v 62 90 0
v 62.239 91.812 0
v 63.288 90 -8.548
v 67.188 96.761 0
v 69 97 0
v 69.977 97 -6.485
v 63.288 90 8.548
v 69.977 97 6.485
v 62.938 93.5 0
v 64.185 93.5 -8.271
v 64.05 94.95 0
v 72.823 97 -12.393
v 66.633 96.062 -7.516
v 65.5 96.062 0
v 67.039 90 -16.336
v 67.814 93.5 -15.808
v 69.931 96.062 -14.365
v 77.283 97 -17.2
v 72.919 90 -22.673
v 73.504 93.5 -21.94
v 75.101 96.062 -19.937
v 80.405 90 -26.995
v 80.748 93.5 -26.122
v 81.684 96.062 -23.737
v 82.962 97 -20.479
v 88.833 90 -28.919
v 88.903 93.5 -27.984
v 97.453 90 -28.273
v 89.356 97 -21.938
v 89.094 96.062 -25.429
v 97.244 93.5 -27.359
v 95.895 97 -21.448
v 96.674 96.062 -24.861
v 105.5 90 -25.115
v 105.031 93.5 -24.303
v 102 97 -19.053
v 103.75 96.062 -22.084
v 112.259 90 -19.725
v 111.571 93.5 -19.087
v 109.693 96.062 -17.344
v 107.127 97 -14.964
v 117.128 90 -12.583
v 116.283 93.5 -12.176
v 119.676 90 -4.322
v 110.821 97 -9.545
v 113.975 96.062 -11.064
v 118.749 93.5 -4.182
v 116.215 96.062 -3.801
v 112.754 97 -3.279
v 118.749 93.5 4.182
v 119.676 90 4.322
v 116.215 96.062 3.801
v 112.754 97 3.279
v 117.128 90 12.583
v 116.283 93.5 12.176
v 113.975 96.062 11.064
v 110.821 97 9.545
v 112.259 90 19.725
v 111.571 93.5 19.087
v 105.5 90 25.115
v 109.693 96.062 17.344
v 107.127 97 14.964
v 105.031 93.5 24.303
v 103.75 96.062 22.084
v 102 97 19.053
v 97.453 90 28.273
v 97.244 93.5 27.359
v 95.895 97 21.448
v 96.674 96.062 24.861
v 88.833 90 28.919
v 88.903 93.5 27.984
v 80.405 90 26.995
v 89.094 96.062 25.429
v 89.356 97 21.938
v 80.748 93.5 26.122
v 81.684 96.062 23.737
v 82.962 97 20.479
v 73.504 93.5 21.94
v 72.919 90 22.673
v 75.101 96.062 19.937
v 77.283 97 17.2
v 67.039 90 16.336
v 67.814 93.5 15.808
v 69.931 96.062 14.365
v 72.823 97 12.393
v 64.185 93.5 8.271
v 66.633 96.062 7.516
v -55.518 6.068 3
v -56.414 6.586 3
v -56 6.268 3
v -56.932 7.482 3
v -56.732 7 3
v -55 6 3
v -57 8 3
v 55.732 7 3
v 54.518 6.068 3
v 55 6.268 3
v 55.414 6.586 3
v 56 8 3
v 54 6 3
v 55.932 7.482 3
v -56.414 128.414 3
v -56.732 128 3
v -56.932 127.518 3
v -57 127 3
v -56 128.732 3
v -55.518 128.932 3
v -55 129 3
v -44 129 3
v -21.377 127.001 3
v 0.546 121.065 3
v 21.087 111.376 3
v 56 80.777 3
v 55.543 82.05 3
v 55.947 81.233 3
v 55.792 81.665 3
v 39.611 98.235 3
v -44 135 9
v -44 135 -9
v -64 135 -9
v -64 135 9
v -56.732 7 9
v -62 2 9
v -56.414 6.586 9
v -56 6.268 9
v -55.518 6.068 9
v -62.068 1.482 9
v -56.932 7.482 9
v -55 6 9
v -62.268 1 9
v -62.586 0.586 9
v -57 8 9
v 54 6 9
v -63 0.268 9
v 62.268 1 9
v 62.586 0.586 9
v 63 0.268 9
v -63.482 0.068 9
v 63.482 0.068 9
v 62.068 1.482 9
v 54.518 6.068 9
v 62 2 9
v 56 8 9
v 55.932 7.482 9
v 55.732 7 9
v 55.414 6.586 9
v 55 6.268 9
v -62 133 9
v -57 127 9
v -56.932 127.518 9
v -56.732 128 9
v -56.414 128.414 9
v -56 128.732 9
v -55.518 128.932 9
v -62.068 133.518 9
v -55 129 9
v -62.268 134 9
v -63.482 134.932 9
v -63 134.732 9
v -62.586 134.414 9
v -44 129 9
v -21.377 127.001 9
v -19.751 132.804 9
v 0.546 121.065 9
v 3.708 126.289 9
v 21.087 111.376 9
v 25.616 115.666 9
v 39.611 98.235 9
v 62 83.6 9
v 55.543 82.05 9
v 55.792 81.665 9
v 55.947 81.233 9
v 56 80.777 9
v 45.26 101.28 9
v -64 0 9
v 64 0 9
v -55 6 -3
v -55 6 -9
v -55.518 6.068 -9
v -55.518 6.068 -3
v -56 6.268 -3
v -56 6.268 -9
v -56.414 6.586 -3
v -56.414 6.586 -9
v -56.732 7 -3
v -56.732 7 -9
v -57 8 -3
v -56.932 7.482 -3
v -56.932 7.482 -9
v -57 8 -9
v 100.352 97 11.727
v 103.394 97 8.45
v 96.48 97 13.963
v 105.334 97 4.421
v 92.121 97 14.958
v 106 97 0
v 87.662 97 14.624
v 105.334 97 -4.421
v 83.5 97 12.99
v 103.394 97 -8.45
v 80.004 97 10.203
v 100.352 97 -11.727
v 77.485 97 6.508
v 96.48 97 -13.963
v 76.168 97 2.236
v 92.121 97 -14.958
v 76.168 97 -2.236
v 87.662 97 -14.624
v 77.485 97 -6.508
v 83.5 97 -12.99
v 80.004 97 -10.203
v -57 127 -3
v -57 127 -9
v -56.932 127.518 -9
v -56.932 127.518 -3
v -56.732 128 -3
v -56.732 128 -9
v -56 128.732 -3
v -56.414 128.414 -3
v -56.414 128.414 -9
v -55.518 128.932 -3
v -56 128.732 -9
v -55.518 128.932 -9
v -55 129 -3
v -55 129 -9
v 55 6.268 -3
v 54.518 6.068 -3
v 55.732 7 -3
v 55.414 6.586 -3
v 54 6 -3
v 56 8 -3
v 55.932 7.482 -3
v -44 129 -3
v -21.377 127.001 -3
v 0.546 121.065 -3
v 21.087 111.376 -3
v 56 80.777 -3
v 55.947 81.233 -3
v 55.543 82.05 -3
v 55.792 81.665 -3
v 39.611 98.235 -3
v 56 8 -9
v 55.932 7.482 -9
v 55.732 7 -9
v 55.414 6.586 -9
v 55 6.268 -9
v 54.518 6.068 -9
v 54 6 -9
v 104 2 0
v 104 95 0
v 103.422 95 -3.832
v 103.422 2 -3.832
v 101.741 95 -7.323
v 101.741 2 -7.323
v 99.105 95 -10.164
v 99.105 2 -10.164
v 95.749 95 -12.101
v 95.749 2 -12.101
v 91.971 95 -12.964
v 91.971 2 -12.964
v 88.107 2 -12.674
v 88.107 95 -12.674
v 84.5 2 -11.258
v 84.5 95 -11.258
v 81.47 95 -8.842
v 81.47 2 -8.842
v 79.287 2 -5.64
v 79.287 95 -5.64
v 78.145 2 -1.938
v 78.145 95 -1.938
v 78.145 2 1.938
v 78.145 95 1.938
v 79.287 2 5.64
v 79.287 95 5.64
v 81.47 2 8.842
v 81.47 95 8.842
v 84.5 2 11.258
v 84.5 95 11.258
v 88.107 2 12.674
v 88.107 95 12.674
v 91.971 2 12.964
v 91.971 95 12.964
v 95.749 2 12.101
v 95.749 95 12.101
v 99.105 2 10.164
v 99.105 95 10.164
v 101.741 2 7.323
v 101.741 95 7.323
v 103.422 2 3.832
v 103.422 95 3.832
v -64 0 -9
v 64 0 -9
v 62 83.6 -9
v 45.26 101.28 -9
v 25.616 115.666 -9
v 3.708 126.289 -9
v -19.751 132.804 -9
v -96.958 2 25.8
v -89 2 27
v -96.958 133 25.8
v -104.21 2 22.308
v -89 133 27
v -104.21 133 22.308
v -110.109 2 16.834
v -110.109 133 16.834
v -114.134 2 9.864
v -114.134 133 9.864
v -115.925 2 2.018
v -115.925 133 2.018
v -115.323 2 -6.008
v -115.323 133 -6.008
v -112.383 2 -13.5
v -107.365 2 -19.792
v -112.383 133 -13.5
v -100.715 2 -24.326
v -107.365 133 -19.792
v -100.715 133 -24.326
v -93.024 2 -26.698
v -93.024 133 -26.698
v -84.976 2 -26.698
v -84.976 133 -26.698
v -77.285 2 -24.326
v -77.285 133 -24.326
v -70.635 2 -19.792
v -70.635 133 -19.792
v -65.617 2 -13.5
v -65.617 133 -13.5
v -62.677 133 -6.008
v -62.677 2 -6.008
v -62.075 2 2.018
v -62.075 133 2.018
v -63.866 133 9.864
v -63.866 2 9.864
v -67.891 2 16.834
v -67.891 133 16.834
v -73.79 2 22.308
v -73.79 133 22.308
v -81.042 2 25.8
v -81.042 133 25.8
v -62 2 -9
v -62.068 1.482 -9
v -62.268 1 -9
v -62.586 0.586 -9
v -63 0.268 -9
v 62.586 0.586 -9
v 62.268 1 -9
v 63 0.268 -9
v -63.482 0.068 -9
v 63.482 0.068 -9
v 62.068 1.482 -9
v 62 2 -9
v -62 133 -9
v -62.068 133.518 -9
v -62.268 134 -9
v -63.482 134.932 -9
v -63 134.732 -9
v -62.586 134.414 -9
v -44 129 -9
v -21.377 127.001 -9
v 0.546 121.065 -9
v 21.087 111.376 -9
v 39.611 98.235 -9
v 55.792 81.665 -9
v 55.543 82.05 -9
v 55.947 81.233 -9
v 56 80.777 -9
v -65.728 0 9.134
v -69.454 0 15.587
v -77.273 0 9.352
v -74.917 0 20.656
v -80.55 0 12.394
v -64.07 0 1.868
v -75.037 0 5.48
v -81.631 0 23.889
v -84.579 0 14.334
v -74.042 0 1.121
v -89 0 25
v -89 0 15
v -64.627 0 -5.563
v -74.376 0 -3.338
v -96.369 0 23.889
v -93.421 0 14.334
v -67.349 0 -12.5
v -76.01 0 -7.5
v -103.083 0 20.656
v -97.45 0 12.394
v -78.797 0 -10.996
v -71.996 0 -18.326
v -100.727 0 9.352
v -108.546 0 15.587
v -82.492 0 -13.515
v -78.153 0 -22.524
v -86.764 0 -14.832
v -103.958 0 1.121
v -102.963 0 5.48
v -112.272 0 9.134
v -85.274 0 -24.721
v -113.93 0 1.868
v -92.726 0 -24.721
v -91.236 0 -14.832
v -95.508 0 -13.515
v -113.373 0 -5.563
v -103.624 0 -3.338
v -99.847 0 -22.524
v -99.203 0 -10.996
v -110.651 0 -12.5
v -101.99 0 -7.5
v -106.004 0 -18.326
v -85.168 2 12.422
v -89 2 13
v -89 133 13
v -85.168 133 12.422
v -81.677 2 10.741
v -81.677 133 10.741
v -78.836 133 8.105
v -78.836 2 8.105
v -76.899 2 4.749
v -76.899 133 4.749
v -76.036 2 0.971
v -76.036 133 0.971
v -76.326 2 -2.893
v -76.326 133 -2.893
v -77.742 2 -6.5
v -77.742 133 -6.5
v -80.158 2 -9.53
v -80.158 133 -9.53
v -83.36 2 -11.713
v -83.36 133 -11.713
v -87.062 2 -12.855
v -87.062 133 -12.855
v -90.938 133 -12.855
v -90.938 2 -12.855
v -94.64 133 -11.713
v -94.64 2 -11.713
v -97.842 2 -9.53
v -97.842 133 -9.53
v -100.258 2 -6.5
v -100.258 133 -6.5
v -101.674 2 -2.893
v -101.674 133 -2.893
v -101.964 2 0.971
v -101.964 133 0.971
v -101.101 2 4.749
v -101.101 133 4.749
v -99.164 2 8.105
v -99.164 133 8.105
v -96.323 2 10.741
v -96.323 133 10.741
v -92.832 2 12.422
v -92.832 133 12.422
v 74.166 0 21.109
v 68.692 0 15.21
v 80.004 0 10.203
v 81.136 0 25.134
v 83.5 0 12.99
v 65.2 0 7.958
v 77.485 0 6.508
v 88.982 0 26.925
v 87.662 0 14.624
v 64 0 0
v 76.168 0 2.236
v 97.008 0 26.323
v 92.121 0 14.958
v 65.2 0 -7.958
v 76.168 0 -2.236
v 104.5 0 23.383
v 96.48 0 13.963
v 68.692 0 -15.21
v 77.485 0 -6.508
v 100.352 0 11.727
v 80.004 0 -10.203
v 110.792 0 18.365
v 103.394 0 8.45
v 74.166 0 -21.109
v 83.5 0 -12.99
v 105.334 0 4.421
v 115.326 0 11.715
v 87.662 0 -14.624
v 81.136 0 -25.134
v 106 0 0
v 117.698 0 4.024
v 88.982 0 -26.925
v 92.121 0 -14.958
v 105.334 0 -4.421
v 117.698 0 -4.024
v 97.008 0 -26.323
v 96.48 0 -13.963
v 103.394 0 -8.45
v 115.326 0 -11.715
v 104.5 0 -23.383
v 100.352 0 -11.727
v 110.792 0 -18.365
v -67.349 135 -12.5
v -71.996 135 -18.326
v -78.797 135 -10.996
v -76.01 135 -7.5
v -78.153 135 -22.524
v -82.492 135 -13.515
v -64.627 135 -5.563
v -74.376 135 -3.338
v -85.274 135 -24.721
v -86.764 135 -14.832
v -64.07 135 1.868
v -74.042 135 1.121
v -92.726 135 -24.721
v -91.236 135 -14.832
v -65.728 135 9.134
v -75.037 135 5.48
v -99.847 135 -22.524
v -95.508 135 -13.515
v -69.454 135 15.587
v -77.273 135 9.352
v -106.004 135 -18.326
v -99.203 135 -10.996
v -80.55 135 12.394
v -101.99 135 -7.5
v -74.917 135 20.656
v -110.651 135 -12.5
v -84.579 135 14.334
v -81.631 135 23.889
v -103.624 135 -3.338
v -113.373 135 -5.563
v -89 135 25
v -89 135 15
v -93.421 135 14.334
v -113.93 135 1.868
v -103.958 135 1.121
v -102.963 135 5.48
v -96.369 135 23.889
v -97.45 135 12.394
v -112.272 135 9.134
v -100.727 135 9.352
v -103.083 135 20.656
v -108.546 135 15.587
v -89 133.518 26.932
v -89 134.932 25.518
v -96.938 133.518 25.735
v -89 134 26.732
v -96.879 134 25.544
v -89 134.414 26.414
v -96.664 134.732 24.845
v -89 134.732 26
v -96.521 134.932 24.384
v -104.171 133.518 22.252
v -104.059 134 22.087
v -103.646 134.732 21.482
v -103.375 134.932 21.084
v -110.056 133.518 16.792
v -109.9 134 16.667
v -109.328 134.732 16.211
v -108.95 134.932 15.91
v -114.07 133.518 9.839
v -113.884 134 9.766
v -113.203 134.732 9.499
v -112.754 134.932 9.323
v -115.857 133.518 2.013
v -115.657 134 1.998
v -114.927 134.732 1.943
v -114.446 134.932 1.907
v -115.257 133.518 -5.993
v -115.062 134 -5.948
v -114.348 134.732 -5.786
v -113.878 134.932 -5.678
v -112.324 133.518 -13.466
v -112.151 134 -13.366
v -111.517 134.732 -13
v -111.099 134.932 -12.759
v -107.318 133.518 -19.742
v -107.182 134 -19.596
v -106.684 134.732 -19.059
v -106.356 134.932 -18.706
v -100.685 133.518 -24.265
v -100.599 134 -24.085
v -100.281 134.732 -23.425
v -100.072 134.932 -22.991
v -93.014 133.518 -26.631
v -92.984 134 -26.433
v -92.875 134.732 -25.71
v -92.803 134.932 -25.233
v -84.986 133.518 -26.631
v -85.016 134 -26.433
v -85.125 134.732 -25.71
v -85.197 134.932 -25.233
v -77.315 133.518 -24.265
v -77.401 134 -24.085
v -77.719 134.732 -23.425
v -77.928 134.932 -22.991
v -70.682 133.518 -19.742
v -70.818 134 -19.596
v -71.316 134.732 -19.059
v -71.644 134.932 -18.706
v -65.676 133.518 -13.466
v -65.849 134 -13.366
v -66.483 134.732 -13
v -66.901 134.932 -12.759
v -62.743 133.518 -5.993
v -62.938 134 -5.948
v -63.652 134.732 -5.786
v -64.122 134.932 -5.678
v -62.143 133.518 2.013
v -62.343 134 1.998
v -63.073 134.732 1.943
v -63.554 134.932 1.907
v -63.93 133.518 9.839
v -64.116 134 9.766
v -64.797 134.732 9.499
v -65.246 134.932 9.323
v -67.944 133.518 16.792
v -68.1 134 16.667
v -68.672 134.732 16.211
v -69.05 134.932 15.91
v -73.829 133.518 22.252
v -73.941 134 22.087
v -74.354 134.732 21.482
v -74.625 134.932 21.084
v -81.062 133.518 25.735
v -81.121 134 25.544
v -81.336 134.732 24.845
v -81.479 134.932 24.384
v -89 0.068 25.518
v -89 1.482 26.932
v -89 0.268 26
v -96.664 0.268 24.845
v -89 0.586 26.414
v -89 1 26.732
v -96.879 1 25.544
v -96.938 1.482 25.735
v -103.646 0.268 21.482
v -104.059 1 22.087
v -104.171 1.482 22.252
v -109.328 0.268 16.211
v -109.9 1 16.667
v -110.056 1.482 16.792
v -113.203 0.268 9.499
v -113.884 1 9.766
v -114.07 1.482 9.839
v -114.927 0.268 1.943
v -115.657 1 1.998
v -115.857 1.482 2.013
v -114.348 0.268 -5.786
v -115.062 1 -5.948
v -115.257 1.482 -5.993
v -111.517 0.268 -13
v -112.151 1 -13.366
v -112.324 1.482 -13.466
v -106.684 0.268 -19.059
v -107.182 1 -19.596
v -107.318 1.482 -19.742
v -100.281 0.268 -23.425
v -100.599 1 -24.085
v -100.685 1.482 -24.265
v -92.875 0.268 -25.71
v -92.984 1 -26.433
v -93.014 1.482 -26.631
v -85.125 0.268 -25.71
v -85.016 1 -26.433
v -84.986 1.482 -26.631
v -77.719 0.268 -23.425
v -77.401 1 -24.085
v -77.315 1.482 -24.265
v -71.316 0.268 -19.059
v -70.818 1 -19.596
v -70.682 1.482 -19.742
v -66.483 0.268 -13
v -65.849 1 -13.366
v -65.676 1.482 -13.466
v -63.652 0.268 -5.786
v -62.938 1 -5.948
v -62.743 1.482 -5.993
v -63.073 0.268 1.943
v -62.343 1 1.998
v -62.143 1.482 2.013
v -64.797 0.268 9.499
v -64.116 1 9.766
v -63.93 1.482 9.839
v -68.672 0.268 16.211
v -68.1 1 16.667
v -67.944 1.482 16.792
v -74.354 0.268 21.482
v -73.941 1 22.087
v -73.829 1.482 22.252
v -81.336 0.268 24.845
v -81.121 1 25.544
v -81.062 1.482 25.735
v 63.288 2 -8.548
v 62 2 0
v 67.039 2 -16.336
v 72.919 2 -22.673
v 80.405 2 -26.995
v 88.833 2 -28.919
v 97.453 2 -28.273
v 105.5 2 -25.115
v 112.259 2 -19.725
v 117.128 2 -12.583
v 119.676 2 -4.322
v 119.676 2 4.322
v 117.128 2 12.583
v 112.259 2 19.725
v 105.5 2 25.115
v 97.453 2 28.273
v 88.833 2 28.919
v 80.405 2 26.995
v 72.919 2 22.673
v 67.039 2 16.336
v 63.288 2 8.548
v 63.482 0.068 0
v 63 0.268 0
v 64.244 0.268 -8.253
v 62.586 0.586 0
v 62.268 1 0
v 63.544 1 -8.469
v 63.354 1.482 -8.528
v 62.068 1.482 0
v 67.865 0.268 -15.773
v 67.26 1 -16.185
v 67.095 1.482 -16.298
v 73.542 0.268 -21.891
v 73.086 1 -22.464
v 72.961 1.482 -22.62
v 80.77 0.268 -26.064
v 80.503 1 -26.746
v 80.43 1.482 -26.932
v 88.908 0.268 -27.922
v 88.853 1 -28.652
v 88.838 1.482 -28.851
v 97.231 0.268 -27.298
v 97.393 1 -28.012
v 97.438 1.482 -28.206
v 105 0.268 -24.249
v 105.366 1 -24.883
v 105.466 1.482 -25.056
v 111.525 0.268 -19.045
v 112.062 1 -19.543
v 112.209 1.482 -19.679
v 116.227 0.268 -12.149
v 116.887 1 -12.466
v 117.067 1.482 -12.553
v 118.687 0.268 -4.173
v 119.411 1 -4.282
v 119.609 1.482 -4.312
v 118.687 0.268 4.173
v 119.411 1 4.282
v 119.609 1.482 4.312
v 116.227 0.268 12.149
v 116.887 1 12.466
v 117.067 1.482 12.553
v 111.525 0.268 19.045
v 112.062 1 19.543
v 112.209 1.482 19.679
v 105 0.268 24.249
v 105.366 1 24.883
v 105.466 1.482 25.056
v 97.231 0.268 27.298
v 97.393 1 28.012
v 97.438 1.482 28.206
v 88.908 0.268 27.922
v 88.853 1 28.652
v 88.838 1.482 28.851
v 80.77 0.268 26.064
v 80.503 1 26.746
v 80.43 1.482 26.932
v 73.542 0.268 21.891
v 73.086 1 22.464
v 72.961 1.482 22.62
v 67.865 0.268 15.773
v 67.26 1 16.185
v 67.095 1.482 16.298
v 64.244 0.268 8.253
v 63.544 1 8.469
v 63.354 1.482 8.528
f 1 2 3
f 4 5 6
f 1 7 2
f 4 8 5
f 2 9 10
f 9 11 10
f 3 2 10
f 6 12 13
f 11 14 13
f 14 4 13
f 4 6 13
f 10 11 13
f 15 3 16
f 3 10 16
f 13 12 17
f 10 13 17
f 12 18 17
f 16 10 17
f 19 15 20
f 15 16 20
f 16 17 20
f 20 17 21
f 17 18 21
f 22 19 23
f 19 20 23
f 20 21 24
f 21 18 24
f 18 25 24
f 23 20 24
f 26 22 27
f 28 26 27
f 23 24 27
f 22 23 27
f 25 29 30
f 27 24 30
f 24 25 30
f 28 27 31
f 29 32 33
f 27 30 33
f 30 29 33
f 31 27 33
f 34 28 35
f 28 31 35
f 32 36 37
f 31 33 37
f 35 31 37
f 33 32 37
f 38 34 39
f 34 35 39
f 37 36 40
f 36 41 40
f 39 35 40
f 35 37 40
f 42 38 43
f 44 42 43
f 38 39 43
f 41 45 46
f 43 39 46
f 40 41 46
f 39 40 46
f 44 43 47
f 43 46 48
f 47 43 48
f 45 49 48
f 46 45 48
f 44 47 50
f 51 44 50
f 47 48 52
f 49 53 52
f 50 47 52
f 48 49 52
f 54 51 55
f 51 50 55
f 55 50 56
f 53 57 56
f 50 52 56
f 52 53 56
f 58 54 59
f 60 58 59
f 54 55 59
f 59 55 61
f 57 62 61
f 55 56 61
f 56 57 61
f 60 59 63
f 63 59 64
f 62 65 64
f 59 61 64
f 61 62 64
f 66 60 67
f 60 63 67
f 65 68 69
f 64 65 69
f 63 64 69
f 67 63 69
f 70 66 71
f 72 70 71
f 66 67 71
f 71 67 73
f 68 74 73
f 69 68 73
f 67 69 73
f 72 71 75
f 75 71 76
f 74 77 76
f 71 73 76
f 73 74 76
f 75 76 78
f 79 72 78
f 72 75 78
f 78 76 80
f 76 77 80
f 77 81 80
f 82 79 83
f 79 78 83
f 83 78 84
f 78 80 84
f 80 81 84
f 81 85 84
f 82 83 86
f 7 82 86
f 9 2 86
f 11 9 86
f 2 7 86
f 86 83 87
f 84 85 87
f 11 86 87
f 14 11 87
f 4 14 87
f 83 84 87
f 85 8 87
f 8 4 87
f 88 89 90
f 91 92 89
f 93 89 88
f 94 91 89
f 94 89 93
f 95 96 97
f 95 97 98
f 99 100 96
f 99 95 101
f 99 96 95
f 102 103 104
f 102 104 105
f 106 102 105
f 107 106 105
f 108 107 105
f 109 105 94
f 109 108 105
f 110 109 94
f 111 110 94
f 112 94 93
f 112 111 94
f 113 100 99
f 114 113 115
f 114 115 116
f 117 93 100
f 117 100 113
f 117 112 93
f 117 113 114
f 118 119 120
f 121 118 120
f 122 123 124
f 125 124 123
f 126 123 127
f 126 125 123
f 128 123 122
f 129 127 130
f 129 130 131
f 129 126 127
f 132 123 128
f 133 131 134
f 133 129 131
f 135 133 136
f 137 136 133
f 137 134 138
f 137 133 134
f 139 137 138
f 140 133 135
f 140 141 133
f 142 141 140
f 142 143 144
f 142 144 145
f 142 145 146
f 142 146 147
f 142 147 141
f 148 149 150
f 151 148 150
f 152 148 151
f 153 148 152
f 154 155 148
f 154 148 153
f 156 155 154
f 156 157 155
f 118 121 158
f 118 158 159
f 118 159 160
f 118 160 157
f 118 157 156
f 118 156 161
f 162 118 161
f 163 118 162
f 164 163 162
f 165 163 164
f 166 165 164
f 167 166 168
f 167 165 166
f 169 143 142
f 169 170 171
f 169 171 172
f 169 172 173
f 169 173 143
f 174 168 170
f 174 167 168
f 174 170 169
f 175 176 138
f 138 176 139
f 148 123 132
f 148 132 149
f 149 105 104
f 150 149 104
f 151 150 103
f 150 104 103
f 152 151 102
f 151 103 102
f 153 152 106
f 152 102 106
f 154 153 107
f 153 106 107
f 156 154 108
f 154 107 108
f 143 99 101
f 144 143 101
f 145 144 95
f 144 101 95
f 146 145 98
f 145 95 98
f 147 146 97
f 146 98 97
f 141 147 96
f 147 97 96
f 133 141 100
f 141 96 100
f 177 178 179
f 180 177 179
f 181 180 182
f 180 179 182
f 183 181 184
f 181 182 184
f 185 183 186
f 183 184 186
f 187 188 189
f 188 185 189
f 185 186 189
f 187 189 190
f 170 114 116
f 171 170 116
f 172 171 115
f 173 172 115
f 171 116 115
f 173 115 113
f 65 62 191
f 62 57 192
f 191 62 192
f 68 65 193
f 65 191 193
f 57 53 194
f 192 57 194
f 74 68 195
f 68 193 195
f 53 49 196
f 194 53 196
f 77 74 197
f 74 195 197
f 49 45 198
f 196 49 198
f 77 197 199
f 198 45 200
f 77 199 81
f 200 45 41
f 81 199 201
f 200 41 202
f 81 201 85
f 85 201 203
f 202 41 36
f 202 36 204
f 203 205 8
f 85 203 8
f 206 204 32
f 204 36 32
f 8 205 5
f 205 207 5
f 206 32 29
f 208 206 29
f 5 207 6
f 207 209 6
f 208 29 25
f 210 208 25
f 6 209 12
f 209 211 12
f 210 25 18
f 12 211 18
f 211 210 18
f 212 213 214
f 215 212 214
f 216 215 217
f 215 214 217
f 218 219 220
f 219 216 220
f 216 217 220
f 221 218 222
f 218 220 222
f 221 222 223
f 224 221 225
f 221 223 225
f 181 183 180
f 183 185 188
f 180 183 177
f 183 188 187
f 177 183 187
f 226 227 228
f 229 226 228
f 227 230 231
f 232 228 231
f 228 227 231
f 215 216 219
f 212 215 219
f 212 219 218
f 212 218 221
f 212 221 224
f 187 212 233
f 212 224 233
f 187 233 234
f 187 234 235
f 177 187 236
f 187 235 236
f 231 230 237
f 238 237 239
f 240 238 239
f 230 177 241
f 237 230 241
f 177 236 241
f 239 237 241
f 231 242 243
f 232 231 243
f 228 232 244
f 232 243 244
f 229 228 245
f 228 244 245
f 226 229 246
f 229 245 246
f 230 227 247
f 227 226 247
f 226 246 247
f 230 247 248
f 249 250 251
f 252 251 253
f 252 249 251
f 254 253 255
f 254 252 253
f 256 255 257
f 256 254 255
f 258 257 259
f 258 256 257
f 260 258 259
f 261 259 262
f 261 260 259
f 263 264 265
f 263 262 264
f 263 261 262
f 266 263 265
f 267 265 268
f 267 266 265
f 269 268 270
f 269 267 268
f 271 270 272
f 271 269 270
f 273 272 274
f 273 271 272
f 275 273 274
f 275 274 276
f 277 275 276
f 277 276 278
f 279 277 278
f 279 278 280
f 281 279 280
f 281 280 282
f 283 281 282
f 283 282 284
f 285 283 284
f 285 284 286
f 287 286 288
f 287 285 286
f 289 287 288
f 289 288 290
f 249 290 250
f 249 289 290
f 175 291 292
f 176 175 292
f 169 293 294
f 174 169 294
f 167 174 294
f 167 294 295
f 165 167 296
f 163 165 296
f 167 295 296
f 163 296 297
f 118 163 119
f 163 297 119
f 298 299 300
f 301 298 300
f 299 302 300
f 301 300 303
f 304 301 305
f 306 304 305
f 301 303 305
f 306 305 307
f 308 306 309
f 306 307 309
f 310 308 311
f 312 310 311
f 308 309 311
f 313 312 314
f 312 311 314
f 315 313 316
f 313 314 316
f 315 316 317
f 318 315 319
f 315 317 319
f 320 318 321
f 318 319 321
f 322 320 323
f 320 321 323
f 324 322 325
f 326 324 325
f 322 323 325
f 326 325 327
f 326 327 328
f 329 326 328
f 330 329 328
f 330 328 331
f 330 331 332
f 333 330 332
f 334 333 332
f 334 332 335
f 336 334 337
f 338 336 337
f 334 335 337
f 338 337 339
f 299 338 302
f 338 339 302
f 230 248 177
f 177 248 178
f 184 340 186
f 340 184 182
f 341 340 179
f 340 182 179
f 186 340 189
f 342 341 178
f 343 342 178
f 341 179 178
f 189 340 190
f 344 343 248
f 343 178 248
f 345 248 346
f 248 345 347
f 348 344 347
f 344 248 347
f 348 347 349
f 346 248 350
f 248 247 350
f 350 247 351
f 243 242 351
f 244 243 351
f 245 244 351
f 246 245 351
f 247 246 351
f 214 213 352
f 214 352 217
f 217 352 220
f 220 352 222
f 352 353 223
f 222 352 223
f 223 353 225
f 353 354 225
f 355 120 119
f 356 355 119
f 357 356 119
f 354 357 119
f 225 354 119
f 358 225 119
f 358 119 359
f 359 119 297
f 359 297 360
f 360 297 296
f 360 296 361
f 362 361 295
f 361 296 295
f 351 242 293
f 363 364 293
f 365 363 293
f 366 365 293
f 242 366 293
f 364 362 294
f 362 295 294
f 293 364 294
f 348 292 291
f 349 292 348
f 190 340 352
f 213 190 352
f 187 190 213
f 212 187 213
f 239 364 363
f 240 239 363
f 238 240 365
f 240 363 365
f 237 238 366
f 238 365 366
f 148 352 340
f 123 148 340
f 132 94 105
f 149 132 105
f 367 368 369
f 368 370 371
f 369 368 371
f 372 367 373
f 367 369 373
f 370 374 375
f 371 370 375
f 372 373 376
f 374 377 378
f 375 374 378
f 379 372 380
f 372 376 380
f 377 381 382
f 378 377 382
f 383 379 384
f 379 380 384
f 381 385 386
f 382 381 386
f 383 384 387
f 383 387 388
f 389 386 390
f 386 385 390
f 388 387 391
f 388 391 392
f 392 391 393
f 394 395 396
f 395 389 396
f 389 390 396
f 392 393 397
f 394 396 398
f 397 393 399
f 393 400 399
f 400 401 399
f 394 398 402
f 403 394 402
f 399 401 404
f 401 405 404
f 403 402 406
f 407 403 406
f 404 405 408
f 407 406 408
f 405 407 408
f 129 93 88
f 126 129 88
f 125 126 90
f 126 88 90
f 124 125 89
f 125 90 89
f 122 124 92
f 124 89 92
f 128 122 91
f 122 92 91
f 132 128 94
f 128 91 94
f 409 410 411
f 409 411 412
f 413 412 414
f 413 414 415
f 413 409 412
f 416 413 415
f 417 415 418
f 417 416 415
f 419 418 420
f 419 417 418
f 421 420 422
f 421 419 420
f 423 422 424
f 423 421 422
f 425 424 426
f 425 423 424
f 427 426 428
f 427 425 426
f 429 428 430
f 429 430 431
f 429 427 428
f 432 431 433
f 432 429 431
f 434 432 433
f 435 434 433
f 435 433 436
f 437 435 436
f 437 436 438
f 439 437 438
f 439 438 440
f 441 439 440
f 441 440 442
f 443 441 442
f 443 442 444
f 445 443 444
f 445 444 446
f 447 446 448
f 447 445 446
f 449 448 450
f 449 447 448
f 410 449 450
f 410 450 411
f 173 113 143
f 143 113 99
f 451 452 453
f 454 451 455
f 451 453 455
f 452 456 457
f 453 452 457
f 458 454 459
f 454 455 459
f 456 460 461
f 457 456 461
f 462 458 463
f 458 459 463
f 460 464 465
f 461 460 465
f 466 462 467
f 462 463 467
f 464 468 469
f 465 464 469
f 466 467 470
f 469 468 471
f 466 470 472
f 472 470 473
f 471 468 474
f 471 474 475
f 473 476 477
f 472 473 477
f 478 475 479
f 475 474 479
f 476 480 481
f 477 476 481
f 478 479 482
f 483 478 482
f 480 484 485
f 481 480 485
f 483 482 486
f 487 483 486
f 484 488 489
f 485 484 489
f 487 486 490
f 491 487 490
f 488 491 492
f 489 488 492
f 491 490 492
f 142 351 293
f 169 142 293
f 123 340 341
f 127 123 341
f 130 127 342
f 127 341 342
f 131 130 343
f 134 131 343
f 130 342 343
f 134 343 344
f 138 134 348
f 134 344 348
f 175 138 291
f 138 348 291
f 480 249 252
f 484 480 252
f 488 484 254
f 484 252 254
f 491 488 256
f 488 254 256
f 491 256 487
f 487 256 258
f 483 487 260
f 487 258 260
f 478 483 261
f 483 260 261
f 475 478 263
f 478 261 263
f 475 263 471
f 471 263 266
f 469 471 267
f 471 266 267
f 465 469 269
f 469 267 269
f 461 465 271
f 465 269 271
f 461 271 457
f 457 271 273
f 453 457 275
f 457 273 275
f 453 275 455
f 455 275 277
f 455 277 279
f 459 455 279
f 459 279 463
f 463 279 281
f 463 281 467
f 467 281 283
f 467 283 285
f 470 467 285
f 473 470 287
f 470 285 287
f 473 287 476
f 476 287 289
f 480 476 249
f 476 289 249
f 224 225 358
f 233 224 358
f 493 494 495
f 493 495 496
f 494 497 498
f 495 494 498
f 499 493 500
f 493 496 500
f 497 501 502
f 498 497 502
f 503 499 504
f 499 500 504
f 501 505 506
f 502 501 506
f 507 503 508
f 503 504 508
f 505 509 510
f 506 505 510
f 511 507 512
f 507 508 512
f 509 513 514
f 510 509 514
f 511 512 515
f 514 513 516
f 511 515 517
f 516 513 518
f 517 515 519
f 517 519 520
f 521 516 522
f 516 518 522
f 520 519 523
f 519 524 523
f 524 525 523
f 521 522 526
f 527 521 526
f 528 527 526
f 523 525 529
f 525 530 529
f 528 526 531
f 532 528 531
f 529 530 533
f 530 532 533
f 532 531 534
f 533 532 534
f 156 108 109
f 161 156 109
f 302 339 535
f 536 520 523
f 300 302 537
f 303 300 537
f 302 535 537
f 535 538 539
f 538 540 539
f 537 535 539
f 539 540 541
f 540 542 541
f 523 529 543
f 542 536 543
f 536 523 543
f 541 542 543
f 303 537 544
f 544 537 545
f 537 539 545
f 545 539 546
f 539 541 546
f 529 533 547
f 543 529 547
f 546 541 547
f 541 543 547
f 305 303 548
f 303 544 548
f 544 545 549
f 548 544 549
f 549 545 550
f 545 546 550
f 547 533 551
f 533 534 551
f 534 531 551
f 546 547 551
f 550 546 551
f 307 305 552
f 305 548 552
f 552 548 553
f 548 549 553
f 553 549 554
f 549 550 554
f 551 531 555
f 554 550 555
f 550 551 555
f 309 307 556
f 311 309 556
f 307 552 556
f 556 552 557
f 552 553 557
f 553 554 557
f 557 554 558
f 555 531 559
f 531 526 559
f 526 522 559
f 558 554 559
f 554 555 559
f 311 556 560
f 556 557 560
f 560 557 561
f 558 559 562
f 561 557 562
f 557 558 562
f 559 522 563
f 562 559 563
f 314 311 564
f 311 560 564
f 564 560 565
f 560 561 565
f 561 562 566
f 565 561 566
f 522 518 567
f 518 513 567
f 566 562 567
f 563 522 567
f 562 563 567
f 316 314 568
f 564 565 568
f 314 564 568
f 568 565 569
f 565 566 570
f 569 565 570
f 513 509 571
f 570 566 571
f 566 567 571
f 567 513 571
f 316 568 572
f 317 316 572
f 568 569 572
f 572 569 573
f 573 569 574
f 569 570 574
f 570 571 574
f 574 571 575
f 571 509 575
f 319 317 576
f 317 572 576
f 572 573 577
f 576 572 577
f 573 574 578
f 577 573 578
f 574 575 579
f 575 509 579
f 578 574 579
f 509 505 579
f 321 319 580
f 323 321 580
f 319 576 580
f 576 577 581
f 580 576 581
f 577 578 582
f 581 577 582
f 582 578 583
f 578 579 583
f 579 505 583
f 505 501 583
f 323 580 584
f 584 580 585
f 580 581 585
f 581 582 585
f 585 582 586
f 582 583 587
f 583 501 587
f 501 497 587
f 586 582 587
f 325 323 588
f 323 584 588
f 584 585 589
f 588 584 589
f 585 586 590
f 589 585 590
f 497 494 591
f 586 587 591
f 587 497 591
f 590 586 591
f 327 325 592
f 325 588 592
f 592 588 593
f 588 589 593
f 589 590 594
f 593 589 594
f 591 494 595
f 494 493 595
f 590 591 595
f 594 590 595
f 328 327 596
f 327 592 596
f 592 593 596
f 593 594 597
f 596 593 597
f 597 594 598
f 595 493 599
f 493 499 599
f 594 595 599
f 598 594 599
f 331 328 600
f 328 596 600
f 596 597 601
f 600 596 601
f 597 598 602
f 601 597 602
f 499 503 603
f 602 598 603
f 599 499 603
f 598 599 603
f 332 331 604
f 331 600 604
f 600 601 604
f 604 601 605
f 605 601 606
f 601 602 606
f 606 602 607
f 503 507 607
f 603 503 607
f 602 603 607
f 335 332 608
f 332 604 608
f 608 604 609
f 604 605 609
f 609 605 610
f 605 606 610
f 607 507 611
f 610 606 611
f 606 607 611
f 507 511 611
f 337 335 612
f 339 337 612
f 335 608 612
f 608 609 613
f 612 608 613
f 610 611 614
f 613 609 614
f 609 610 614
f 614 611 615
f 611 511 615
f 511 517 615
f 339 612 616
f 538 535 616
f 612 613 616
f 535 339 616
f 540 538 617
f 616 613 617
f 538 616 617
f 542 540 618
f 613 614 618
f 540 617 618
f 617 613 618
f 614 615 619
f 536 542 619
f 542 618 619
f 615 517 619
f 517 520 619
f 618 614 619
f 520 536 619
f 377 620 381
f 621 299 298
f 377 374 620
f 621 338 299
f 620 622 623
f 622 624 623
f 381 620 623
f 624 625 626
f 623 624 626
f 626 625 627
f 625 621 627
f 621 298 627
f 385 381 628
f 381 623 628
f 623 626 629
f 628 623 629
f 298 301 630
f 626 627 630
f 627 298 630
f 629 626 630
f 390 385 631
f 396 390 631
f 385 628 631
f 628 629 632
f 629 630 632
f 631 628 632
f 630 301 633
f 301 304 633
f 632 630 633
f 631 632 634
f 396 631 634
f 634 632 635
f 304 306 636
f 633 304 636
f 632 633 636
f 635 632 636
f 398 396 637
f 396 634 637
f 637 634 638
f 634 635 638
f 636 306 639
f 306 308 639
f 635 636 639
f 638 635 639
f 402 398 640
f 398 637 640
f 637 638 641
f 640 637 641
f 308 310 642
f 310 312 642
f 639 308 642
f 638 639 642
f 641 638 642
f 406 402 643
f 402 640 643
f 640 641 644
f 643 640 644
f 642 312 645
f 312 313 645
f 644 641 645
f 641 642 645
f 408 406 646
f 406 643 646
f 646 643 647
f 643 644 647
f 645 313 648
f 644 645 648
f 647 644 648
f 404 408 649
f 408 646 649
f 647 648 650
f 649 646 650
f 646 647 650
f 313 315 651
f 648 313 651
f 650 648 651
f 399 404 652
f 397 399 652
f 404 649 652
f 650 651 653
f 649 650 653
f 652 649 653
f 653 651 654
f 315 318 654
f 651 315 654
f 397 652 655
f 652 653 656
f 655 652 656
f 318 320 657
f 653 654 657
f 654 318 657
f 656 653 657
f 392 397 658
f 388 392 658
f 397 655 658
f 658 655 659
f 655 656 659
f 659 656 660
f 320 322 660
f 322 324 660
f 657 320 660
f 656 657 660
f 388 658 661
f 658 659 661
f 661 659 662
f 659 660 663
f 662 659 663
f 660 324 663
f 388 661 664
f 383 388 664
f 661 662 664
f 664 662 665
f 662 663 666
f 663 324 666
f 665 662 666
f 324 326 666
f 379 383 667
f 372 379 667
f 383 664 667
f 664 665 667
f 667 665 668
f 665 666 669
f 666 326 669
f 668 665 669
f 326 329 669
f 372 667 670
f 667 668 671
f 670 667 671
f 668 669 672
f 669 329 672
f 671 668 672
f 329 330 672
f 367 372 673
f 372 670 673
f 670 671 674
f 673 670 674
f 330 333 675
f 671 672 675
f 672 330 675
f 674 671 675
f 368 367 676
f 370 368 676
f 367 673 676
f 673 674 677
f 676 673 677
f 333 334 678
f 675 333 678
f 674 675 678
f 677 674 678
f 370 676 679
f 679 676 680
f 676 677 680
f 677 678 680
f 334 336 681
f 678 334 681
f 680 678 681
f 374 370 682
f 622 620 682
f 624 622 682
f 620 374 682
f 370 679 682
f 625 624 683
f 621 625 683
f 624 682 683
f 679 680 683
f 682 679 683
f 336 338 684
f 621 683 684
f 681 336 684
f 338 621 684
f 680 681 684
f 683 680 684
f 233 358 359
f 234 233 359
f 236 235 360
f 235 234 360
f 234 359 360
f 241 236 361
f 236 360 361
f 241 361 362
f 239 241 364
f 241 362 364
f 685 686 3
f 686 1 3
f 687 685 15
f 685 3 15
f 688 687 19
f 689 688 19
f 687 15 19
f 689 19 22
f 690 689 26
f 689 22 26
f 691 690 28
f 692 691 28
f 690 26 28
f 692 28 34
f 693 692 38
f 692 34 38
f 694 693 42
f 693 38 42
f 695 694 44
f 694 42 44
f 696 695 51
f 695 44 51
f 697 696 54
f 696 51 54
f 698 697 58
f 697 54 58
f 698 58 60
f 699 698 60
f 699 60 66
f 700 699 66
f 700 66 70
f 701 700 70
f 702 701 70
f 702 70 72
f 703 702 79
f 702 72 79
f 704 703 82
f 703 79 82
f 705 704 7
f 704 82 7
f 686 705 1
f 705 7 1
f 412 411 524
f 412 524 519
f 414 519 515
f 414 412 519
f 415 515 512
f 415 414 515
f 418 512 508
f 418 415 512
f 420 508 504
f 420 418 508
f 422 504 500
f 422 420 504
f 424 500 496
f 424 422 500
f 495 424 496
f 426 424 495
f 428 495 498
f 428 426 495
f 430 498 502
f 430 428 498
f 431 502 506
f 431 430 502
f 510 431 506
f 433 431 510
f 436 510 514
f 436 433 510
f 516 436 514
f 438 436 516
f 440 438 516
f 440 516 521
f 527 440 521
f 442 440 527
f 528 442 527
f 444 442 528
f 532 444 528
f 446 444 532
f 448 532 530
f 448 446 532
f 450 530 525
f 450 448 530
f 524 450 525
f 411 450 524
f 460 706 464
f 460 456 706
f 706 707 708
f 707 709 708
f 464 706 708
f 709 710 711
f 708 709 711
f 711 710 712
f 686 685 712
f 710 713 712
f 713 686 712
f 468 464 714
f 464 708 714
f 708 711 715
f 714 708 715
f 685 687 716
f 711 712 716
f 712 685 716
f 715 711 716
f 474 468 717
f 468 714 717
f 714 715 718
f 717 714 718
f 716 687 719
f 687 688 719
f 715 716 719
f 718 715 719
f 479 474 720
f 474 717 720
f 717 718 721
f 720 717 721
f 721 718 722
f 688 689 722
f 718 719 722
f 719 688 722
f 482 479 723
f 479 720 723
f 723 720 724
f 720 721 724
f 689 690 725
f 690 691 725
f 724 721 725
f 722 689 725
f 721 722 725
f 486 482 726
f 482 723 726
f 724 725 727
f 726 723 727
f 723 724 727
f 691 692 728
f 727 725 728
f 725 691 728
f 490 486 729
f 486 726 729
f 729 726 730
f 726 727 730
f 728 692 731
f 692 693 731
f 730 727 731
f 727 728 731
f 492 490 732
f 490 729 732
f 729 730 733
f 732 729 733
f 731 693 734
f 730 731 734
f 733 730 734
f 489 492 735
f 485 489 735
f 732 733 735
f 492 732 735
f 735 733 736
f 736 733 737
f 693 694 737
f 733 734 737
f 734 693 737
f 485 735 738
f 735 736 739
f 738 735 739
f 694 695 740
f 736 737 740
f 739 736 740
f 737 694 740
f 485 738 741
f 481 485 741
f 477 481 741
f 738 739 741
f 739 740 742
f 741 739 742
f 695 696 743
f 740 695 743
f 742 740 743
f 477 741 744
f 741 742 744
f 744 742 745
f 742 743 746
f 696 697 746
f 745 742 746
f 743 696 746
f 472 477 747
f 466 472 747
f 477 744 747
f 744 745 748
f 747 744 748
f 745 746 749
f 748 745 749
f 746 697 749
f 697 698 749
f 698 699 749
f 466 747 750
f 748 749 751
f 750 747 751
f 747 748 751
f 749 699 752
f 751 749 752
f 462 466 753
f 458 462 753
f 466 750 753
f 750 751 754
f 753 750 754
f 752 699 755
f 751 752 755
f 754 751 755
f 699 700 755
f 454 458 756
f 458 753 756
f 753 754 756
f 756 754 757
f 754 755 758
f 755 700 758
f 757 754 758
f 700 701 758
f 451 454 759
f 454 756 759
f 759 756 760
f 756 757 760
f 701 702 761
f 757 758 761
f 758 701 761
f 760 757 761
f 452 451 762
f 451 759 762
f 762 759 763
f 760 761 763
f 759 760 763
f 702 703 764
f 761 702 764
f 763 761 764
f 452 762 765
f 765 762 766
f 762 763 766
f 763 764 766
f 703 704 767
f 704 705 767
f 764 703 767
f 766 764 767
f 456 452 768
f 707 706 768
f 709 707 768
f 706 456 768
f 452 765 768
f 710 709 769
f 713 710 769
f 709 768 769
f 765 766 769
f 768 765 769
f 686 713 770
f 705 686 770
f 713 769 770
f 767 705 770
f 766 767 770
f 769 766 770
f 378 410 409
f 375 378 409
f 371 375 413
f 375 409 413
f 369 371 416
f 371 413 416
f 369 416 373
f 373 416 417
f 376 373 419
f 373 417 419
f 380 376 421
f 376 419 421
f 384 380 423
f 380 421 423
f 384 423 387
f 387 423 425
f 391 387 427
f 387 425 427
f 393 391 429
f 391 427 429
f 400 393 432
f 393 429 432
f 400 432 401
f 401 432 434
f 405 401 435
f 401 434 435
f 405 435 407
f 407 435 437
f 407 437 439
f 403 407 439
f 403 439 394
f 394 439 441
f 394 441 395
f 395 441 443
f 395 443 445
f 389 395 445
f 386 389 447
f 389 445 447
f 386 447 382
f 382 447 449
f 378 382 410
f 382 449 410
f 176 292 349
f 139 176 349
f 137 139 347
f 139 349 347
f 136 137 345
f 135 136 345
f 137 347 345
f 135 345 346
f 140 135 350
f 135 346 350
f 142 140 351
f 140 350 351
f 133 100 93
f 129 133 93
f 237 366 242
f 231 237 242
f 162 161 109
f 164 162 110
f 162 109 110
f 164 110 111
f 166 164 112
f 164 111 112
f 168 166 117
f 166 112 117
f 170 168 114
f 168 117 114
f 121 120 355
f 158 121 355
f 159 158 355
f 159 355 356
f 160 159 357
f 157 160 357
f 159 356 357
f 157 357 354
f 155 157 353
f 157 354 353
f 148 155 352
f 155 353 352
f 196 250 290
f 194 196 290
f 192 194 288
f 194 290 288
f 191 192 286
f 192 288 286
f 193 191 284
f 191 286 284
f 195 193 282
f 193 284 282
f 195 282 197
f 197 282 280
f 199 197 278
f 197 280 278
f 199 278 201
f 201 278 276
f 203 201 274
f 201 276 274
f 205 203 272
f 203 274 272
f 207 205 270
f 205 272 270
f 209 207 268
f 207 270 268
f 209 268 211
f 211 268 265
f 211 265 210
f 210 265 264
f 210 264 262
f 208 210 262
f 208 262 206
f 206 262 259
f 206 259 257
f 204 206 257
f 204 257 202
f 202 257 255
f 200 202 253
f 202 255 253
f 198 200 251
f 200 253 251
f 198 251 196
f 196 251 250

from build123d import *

# Parameters (mm, degrees)
EXTRUDE_1_DEPTH      = 9
EXTRUDE_1_DEPTH_BACK = 9
EXTRUDE_2_DEPTH      = 3
EXTRUDE_2_DEPTH_BACK = 3
SKETCH_2_R           = 13
CUT_EXTRUDE_1_DEPTH  = 135
CHAMFER_1_SIZE       = 2
CHAMFER_2_SIZE       = 2


with BuildPart() as part:
    # Эскиз1 → Повернуть1 (revolve)
    with BuildSketch(Plane.XY, mode=Mode.PRIVATE) as revolve_1_sk:
        with BuildLine():
            Line((-62, 2), (-62, 133))
            ThreePointArc((-62, 133), (-62.585786438, 134.414213562), (-64, 135))
            Line((-64, 135), (-89, 135))
            Line((-89, 135), (-89, 0))
            Line((-89, 0), (-64, 0))
            ThreePointArc((-64, 0), (-62.585786438, 0.585786438), (-62, 2))
        make_face()
    revolve(revolve_1_sk.sketch.rotate(Axis((-89, 135, 0), (0, -1, 0)), 90), axis=Axis((-89, 135, 0), (0, -1, 0)))


with BuildPart() as body_2:
    # Эскиз1<4> → Повернуть2 (revolve)
    with BuildSketch(Plane.XY):
        with BuildLine():
            Line((62, 2), (62, 90))
            ThreePointArc((62, 90), (64.050252532, 94.949747468), (69, 97))
            Line((69, 97), (91, 97))
            Line((91, 97), (91, 0))
            Line((91, 0), (64, 0))
            ThreePointArc((64, 0), (62.585786438, 0.585786438), (62, 2))
        make_face()
    revolve(axis=Axis((91, 97, 0), (0, -1, 0)))


with BuildPart() as body_3:
    # Эскиз1<5> → Бобышка-Вытянуть1 (new, two sides: drawn at the far end of the back side and taken through both)
    with BuildSketch(Plane.XY.offset(-EXTRUDE_1_DEPTH_BACK)):
        with BuildLine():
            ThreePointArc((-62, 2), (-62.585786438, 0.585786438), (-64, 0))
            Line((-64, 0), (-44, 0))
            Line((-44, 0), (64, 0))
            ThreePointArc((64, 0), (62.585786438, 0.585786438), (62, 2))
            Line((62, 2), (62, 83.600239234))
            ThreePointArc((62, 83.600239234), (14.902324671, 121.472285515), (-44, 135))
            Line((-44, 135), (-64, 135))
            ThreePointArc((-64, 135), (-62.585786438, 134.414213562), (-62, 133))
            Line((-62, 133), (-62, 2))
        make_face()
        with BuildLine():
            Line((54, 6), (-44, 6))
            Line((-44, 6), (-55, 6))
            ThreePointArc((-55, 6), (-56.414213562, 6.585786438), (-57, 8))
            Line((-57, 8), (-57, 127))
            ThreePointArc((-57, 127), (-56.414213562, 128.414213562), (-55, 129))
            Line((-55, 129), (-44, 129))
            ThreePointArc((-44, 129), (11.03002354, 116.673461032), (55.543307087, 82.049558282))
            ThreePointArc((55.543307087, 82.049558282), (55.882367415, 81.453262691), (56, 80.777472107))
            Line((56, 80.777472107), (56, 8))
            ThreePointArc((56, 8), (55.414213562, 6.585786438), (54, 6))
        make_face(mode=Mode.SUBTRACT)
    extrude(amount=EXTRUDE_1_DEPTH + EXTRUDE_1_DEPTH_BACK)

    # Эскиз1<6> → Бобышка-Вытянуть2 (add, two sides: drawn at the far end of the back side and taken through both)
    with BuildSketch(Plane.XY.offset(-EXTRUDE_2_DEPTH_BACK)):
        with BuildLine():
            Line((-44, 129), (-44, 6))
            Line((-44, 6), (54, 6))
            ThreePointArc((54, 6), (55.414213562, 6.585786438), (56, 8))
            Line((56, 8), (56, 80.777472107))
            ThreePointArc((56, 80.777472107), (55.882367415, 81.453262691), (55.543307087, 82.049558282))
            ThreePointArc((55.543307087, 82.049558282), (11.03002354, 116.673461032), (-44, 129))
        make_face()
        with BuildLine():
            Line((-55, 6), (-44, 6))
            Line((-44, 6), (-44, 129))
            Line((-44, 129), (-55, 129))
            ThreePointArc((-55, 129), (-56.414213562, 128.414213562), (-57, 127))
            Line((-57, 127), (-57, 8))
            ThreePointArc((-57, 8), (-56.414213562, 6.585786438), (-55, 6))
        make_face()
    extrude(amount=EXTRUDE_2_DEPTH + EXTRUDE_2_DEPTH_BACK)


with BuildPart() as cut_extrude_1_tool:
    # Эскиз2 → Вырез-Вытянуть1 (new body)
    with BuildSketch(Plane(origin=(0, 0, 0), x_dir=(1, 0, 0), z_dir=(0, 1, 0))):
        with Locations(Location((-89, 0, 0), (0, 0, 270))):
            Circle(SKETCH_2_R)
        with Locations((91, 0)):
            Circle(SKETCH_2_R)
    extrude(amount=CUT_EXTRUDE_1_DEPTH)


with BuildPart() as part_1:
    add(part.part)

    # Вырез-Вытянуть1: cut by cut_extrude_1_tool
    add(cut_extrude_1_tool.part, mode=Mode.SUBTRACT)

    # Фаска2
    chamfer_2_edges = [part_1.edges().sort_by_distance(p)[0] for p in [
        (-89, 135, -13),
        (-89, 0, -13),
    ]]
    chamfer(chamfer_2_edges, length=CHAMFER_2_SIZE)


with BuildPart() as body_2_1:
    add(body_2.part)

    # Вырез-Вытянуть1: cut by cut_extrude_1_tool
    add(cut_extrude_1_tool.part, mode=Mode.SUBTRACT)

    # Фаска1
    chamfer_1_edges = [body_2_1.edges().sort_by_distance(p)[0] for p in [
        (78, 97, 0),
        (78, 0, 0),
    ]]
    chamfer(chamfer_1_edges, length=CHAMFER_1_SIZE)


solid = Compound([body_3.part, part_1.part, body_2_1.part])
